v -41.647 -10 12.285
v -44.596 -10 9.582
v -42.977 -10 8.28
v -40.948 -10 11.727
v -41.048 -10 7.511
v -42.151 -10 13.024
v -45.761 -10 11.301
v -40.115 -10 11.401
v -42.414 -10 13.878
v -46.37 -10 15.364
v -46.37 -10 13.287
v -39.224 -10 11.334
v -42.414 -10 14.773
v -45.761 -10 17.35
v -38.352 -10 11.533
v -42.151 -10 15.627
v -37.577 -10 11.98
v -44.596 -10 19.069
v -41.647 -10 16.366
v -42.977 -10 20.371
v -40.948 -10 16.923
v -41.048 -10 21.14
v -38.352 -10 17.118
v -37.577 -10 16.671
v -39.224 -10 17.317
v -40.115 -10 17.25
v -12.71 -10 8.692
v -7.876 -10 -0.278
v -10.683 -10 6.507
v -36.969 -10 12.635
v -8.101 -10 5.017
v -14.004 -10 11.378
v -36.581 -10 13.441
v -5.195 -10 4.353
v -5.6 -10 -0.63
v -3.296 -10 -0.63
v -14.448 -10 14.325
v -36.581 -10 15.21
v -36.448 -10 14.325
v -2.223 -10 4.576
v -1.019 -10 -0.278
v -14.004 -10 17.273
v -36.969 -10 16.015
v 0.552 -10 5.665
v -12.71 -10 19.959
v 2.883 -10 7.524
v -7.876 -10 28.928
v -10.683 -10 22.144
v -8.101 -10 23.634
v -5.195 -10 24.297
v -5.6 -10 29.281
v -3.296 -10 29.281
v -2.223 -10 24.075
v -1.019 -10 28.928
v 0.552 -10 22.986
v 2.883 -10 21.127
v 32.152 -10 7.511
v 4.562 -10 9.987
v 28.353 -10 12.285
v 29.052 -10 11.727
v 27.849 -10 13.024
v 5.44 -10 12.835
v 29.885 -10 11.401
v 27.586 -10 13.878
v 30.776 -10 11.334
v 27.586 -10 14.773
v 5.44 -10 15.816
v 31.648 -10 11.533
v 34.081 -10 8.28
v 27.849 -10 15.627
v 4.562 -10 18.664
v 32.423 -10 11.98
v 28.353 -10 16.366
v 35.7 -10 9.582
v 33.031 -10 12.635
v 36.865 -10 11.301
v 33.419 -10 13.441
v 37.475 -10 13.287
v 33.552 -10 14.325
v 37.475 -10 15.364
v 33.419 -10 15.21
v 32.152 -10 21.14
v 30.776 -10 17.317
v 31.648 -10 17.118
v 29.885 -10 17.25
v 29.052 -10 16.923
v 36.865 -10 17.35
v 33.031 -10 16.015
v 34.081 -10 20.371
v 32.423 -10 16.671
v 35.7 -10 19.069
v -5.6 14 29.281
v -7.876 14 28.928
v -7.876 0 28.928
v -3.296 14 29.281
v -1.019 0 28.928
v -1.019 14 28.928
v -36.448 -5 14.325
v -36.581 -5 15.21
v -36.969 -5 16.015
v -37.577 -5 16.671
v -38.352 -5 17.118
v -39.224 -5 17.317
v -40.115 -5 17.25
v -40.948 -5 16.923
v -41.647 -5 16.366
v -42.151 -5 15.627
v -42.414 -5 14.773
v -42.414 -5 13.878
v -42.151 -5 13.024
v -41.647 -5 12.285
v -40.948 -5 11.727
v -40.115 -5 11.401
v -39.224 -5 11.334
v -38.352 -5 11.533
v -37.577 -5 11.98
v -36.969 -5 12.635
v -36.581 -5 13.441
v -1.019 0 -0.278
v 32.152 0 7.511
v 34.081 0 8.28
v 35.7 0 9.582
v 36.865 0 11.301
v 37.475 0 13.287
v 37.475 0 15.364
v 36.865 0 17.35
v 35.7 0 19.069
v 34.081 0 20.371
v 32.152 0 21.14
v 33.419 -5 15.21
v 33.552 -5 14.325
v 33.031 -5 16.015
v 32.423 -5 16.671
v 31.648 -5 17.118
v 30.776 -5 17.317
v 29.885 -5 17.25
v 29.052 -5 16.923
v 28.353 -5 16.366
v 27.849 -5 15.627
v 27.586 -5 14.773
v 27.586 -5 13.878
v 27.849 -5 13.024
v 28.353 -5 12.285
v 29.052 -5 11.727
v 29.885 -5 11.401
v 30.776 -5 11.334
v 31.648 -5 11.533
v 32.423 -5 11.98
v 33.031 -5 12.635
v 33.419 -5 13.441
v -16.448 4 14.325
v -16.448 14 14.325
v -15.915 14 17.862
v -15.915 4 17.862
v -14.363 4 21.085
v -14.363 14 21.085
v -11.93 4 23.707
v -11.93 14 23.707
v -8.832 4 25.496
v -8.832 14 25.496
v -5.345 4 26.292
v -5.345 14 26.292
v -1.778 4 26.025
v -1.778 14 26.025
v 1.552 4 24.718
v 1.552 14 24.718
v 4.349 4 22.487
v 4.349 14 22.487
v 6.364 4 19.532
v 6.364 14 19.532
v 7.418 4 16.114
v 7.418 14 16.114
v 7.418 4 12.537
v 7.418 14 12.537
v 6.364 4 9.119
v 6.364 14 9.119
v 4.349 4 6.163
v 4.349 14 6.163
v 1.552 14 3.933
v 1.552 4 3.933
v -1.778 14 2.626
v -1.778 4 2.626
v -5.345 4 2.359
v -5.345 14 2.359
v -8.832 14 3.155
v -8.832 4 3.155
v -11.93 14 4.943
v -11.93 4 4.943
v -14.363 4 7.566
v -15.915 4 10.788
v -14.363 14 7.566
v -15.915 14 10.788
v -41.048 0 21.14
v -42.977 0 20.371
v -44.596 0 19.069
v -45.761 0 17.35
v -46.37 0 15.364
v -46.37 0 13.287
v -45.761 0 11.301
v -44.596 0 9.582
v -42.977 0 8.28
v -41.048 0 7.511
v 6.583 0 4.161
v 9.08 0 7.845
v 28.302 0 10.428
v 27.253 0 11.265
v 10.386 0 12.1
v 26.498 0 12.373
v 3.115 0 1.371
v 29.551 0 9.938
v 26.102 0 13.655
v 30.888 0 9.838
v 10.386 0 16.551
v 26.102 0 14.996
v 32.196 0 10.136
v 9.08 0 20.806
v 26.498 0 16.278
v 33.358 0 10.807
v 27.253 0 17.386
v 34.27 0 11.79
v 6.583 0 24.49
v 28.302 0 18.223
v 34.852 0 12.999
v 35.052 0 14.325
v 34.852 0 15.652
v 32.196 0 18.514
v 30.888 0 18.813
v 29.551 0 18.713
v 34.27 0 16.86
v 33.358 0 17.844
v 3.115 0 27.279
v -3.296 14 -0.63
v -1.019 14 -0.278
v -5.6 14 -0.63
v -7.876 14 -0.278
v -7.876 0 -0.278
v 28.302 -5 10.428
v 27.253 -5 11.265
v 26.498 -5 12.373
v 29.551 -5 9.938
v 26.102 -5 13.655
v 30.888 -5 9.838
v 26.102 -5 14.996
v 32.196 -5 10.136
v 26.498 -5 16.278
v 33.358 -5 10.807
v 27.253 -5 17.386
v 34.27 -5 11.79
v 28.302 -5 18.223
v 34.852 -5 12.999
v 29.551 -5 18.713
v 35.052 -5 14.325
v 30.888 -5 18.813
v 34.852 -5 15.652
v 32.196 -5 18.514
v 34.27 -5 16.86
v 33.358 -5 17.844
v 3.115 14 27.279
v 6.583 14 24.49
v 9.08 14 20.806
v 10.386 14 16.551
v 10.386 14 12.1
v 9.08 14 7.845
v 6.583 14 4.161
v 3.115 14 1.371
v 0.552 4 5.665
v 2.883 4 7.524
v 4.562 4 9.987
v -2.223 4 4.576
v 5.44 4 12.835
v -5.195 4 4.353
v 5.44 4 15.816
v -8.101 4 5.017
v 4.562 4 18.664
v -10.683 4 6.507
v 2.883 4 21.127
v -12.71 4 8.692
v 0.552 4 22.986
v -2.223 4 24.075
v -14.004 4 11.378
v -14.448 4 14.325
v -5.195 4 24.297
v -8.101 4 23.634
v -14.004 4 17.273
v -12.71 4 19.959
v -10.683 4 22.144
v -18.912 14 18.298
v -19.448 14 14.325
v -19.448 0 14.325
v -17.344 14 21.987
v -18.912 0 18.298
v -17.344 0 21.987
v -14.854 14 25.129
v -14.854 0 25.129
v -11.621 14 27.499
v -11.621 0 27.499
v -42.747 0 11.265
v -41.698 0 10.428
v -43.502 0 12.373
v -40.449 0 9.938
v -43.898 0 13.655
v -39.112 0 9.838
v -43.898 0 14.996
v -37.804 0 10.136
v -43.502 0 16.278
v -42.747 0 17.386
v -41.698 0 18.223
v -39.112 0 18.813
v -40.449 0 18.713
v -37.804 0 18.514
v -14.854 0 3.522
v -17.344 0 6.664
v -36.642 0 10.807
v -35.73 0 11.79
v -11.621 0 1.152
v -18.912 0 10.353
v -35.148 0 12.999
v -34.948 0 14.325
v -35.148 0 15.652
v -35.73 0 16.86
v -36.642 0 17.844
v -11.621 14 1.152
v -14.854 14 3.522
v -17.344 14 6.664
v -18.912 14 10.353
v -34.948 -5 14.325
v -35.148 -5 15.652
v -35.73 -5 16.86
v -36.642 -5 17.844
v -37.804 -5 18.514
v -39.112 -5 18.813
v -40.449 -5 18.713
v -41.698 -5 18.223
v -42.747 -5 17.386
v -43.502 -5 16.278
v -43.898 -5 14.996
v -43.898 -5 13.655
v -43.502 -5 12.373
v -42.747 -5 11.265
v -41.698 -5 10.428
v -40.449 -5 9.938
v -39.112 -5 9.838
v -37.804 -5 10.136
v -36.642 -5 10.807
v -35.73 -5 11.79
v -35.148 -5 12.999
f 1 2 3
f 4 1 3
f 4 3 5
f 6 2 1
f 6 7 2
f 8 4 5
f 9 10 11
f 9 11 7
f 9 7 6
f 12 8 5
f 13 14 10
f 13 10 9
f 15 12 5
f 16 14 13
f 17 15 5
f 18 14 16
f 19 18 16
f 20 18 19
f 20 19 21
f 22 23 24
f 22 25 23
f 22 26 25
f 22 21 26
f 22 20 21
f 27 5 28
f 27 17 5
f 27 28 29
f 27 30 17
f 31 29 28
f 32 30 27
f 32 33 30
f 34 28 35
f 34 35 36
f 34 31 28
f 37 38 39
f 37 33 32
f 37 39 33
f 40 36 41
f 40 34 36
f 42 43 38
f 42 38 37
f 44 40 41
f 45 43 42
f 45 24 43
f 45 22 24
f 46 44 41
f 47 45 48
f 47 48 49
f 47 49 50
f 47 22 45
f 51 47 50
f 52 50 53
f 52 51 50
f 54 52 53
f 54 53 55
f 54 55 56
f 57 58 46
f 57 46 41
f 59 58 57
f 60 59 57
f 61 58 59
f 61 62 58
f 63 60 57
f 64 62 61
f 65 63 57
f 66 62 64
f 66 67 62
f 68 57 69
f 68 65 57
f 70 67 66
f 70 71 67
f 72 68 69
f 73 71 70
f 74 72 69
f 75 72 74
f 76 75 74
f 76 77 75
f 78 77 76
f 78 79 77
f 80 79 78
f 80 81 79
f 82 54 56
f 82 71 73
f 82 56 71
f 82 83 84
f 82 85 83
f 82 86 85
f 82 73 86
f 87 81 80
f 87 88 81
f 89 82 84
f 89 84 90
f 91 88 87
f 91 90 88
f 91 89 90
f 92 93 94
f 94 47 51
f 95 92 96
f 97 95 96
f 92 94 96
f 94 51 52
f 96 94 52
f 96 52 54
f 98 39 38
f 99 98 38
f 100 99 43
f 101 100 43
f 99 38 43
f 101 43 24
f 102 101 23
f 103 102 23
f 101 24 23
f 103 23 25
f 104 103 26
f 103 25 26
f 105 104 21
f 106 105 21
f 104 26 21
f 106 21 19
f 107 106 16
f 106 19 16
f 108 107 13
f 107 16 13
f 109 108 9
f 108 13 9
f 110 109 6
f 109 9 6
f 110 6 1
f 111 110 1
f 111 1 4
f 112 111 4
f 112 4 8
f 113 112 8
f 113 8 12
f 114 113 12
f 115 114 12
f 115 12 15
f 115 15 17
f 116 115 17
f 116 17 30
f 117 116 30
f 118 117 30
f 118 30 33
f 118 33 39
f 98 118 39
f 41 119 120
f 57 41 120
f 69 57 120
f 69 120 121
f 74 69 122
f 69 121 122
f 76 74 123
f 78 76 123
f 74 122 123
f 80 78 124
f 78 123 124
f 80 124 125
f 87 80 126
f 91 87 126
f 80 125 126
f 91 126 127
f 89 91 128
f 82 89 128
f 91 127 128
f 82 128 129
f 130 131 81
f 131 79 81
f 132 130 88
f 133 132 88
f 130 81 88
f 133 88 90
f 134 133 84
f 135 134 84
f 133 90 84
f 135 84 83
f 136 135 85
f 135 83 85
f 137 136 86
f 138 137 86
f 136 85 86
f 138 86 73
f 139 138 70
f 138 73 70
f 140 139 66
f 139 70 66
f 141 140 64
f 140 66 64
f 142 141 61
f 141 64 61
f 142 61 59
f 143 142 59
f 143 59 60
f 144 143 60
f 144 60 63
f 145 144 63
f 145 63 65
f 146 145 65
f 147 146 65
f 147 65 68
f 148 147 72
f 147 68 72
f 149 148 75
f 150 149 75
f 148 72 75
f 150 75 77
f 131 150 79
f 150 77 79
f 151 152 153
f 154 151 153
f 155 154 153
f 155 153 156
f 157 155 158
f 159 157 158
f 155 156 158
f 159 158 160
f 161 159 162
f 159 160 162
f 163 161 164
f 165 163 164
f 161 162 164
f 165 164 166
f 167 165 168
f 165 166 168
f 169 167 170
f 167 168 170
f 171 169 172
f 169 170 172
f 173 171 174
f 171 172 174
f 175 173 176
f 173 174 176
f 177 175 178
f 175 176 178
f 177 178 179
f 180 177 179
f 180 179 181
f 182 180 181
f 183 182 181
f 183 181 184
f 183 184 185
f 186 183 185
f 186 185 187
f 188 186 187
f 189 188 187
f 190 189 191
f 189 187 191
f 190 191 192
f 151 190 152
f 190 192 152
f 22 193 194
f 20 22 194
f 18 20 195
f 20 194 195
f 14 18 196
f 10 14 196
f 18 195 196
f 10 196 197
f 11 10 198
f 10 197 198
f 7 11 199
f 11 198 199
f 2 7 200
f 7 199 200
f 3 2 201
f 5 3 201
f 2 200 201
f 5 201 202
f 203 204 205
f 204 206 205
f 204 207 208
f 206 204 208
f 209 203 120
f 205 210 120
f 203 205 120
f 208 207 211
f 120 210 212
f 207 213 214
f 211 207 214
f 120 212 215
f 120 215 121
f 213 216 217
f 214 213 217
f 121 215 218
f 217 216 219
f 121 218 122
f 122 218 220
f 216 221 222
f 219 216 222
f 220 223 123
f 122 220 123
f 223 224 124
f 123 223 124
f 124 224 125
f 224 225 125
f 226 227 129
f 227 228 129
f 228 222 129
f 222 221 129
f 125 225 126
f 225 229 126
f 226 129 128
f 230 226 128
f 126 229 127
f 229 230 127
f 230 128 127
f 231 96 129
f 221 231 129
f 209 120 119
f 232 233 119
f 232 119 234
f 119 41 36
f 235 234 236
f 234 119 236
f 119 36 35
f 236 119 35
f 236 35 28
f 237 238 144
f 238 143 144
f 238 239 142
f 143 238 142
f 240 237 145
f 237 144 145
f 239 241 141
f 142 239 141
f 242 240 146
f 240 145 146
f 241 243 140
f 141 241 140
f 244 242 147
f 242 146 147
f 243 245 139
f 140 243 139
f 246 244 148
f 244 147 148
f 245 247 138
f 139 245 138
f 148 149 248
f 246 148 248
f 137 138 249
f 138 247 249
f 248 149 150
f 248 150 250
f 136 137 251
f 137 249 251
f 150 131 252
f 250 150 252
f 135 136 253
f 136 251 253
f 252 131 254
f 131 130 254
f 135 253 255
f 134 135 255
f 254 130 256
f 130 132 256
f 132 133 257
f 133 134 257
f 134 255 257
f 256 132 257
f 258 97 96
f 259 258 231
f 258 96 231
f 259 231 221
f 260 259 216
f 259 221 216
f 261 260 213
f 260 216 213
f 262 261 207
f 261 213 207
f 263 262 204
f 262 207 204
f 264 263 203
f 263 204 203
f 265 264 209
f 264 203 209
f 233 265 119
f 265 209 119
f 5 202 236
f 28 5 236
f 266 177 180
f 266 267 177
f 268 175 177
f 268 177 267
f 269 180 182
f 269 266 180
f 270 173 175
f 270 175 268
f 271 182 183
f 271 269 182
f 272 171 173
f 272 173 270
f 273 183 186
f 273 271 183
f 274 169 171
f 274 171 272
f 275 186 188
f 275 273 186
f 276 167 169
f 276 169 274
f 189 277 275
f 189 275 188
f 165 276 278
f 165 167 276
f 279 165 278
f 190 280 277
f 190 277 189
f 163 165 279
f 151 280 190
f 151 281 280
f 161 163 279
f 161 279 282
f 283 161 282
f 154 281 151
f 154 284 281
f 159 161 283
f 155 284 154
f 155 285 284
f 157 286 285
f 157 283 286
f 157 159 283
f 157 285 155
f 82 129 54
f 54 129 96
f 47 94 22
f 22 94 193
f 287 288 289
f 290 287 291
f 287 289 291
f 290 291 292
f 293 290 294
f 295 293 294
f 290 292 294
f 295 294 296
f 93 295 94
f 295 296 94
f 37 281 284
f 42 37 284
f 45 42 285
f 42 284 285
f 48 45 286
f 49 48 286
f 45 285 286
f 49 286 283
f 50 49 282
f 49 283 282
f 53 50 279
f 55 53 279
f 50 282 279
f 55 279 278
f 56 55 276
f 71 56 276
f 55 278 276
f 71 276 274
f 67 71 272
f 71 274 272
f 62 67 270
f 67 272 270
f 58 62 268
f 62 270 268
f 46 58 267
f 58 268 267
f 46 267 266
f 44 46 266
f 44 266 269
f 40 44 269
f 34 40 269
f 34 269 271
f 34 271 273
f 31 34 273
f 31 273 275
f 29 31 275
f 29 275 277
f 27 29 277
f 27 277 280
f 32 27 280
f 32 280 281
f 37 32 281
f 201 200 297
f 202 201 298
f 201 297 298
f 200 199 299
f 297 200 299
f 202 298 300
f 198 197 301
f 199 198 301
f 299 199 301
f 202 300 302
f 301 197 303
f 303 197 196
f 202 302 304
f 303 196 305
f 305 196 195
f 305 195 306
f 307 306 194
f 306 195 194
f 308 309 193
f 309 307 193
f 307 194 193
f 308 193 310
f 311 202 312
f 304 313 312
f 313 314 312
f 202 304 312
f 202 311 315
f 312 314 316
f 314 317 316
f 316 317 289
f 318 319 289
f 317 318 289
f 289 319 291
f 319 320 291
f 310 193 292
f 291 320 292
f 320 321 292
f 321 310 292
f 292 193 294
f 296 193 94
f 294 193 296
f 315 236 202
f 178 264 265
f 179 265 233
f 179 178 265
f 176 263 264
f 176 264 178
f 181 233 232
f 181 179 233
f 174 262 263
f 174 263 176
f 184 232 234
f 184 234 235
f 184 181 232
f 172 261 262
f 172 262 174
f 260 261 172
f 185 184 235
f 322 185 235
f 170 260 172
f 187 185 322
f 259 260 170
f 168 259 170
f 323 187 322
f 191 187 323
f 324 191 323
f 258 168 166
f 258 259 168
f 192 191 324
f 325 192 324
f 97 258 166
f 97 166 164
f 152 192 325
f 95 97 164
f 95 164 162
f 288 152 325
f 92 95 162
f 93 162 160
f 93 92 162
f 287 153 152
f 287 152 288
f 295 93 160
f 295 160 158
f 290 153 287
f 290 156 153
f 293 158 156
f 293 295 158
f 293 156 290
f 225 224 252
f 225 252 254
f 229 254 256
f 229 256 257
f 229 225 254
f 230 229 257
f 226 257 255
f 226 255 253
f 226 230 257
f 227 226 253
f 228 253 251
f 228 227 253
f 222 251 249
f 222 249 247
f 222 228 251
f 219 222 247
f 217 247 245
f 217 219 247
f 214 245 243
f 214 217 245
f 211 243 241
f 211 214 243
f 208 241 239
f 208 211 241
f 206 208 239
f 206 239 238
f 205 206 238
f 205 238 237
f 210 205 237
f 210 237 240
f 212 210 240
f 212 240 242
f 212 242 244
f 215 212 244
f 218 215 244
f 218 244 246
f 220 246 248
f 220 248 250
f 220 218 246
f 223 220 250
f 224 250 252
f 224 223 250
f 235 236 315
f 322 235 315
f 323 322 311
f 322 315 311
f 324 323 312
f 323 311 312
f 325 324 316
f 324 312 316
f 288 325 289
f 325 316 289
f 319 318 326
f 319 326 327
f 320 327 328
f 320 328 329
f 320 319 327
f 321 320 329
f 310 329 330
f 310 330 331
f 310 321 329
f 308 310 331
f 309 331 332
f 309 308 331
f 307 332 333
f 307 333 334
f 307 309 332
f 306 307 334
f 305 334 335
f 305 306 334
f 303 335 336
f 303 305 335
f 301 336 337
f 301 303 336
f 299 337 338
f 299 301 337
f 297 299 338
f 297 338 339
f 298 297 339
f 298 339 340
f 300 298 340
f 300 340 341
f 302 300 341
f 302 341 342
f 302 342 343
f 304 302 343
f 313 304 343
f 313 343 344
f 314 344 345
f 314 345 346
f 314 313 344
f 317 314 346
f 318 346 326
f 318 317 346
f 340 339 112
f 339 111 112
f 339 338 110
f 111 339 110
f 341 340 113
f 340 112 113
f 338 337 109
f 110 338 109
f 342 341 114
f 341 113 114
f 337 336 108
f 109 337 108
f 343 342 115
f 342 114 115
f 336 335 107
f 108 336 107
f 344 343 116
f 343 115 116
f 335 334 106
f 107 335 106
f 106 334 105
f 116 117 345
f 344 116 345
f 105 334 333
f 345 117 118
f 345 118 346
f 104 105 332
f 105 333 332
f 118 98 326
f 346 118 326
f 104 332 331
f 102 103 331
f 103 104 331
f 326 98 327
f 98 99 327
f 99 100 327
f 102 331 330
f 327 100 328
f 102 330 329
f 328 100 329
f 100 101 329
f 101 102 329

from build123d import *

# Parameters (mm, degrees)
F1_DEPTH  = 10
F2_R      = 3
F3_DEPTH  = 10
F4_R      = 4.5
F4_R_2    = 3
F5_DEPTH  = 5
F6_R      = 4.5
F7_DEPTH  = 5
F8_DEPTH  = 5
F10_DEPTH = 14
F11_R     = 10
F12_DEPTH = 20
F13_R     = 10
F14_DEPTH = 40
F15_R     = 12
F15_R_2   = 10
F16_DEPTH = 10


with BuildPart() as f1:
    # F0 (on Front) → F1 (new body)
    with BuildSketch(Plane.XZ):
        with BuildLine():
            Line((32.1521708727, 21.1400806223), (-1.0192576987, 28.9282977823))
            ThreePointArc((-1.0192576987, 28.9282977823), (-4.4478291273, 29.3253906074), (-7.8764005559, 28.9282977823))
            Line((-7.8764005559, 28.9282977823), (-41.0478291273, 21.1400806223))
            ThreePointArc((-41.0478291273, 21.1400806223), (-46.4478291273, 14.3253906074), (-41.0478291273, 7.5107005924))
            Line((-41.0478291273, 7.5107005924), (-7.8764005559, -0.2775165675))
            ThreePointArc((-7.8764005559, -0.2775165675), (-4.4478291273, -0.6746093926), (-1.0192576987, -0.2775165675))
            Line((-1.0192576987, -0.2775165675), (32.1521708727, 7.5107005924))
            ThreePointArc((32.1521708727, 7.5107005924), (37.5521708727, 14.3253906074), (32.1521708727, 21.1400806223))
        make_face()
    extrude(amount=F1_DEPTH)

    # F2 (on face) → F3 (cut)
    with BuildSketch(Plane.XZ.offset(10)):
        with Locations((-39.4478291273, 14.3253906074)):
            Circle(F2_R)
        with Locations((30.5521708727, 14.3253906074)):
            Circle(F2_R)
    extrude(amount=-F3_DEPTH, mode=Mode.SUBTRACT)

    # F4 (on face) → F5 (join)
    with BuildSketch(Plane.XZ.offset(10)):
        with Locations((-39.4478291273, 14.3253906074)):
            Circle(F4_R)
        with Locations((-39.4478291273, 14.3253906074)):
            Circle(F4_R_2, mode=Mode.SUBTRACT)
        with Locations((30.5521708727, 14.3253906074)):
            Circle(F4_R)
        with Locations((30.5521708727, 14.3253906074)):
            Circle(F4_R_2, mode=Mode.SUBTRACT)
    extrude(amount=-F5_DEPTH)

    # F6 (on Front) → F7 (cut)
    with BuildSketch(Plane.XZ):
        with Locations((-39.4478291273, 14.3253906074)):
            Circle(F6_R)
    extrude(amount=-F7_DEPTH, mode=Mode.SUBTRACT)

    # F6 (on Front) → F8 (cut)
    with BuildSketch(Plane.XZ):
        with Locations((-39.4478291273, 14.3253906074)):
            Circle(F6_R)
        with Locations((30.5521708727, 14.3253906074)):
            Circle(F6_R)
    extrude(amount=F8_DEPTH, mode=Mode.SUBTRACT)

    # F9 (on face) → F10 (join)
    with BuildSketch(Plane(origin=(0, 0, 0), x_dir=(-1, 0, 0), z_dir=(0, 1, 0))):
        with BuildLine():
            ThreePointArc((7.8764005559, -0.2775165675), (16.2042863196, 5.0095055563), (19.4478291273, 14.3253906074))
            ThreePointArc((19.4478291273, 14.3253906074), (16.2042863196, 23.6412756585), (7.8764005559, 28.9282977823))
            ThreePointArc((7.8764005559, 28.9282977823), (4.4478291273, 29.3253906074), (1.0192576987, 28.9282977823))
            ThreePointArc((1.0192576987, 28.9282977823), (-10.5521708727, 14.3253906074), (1.0192576987, -0.2775165675))
            ThreePointArc((1.0192576987, -0.2775165675), (4.4478291273, -0.6746093926), (7.8764005559, -0.2775165675))
        make_face()
    extrude(amount=F10_DEPTH)

    # F11 (on face) → F12 (cut)
    with BuildSketch(Plane(origin=(0, 14, 0), x_dir=(-1, 0, 0), z_dir=(0, 1, 0))):
        with Locations((4.4478291273, 14.3253906074)):
            Circle(F11_R)
    extrude(amount=F12_DEPTH, mode=Mode.SUBTRACT)

    # F13 (on face) → F14 (cut)
    with BuildSketch(Plane(origin=(0, 14, 0), x_dir=(-1, 0, 0), z_dir=(0, 1, 0))):
        with Locations((4.4478291273, 14.3253906074)):
            Circle(F13_R)
    extrude(amount=-F14_DEPTH, mode=Mode.SUBTRACT)

    # F15 (on face) → F16 (cut)
    with BuildSketch(Plane(origin=(0, 14, 0), x_dir=(-1, 0, 0), z_dir=(0, 1, 0))):
        with Locations((4.4478291273, 14.3253906074)):
            Circle(F15_R)
        with Locations((4.4478291273, 14.3253906074)):
            Circle(F15_R_2, mode=Mode.SUBTRACT)
    extrude(amount=-F16_DEPTH, mode=Mode.SUBTRACT)


solid = f1.part
